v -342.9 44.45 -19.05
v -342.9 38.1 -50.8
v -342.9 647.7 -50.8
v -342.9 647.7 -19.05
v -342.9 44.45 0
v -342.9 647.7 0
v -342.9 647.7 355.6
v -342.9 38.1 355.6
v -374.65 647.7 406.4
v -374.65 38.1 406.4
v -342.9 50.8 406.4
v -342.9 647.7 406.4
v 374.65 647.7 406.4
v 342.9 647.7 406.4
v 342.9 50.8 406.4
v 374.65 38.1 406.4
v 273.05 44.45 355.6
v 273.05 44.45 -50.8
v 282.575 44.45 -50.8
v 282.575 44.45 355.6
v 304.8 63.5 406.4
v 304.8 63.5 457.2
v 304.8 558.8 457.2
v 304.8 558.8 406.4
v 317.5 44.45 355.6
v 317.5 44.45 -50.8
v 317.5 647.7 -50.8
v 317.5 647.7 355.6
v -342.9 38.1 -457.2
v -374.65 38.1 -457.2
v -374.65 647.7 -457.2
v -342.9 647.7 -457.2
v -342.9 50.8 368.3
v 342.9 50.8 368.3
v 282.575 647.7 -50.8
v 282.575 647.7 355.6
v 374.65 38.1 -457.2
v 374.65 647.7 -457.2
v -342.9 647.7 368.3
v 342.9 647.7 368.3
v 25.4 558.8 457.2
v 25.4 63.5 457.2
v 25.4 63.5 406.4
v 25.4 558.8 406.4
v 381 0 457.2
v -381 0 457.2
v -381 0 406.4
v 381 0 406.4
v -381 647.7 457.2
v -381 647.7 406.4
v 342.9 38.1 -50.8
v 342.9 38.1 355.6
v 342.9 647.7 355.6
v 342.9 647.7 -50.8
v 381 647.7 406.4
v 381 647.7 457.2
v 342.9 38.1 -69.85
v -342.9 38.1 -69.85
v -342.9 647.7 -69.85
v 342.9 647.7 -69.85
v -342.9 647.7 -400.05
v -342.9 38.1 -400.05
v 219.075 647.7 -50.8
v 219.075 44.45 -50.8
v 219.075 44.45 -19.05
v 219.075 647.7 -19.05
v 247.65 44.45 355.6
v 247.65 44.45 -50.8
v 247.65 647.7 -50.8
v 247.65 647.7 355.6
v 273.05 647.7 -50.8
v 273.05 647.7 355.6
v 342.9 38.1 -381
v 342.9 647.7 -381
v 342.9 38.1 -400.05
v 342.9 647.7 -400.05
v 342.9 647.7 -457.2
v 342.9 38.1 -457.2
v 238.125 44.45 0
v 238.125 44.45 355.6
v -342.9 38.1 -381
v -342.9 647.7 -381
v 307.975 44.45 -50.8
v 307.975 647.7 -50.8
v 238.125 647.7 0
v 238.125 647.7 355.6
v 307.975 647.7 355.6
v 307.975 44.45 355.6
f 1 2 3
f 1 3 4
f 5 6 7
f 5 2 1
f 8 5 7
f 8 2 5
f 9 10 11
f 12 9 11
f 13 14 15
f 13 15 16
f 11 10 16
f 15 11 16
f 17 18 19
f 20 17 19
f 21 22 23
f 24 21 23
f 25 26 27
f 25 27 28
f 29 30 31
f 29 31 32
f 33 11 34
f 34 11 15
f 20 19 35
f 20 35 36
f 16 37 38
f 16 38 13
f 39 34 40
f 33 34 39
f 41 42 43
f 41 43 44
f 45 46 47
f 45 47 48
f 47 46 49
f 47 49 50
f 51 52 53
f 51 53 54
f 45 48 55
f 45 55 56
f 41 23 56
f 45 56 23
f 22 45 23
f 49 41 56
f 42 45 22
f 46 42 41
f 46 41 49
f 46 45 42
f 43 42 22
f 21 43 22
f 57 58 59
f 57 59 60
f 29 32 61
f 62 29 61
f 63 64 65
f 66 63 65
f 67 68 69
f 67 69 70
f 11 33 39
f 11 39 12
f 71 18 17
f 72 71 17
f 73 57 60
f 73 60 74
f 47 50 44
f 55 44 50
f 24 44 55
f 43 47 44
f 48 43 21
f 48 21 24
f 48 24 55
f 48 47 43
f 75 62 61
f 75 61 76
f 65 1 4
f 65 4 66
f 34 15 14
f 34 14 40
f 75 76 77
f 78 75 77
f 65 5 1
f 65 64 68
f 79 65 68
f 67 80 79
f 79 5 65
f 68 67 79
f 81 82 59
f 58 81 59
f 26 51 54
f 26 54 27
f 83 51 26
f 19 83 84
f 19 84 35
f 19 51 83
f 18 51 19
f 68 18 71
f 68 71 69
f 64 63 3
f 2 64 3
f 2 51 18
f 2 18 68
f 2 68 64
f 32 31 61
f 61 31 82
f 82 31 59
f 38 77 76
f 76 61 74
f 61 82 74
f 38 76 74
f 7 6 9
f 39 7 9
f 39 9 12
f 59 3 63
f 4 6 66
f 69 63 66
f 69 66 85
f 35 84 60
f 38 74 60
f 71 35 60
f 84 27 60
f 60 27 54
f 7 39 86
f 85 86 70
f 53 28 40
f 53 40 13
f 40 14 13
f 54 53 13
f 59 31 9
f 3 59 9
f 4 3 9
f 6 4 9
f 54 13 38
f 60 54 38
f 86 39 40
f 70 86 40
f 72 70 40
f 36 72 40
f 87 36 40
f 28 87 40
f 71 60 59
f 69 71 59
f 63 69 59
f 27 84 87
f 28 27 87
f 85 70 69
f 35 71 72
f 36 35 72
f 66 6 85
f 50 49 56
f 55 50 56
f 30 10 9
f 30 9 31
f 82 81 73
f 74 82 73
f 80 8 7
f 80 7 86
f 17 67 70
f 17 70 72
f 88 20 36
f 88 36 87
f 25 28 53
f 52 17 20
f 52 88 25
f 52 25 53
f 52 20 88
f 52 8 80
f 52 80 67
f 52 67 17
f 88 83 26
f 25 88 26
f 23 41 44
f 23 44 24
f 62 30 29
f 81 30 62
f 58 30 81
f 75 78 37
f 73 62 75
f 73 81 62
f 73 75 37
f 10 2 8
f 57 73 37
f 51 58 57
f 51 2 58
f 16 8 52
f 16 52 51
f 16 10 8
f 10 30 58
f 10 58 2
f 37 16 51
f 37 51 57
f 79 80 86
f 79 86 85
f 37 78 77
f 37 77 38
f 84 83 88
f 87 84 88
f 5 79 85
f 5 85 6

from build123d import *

# Parameters (mm, degrees)
F1_START = -38.1
F0_W     = 685.8
F0_H     = 19.05
F1_DEPTH = 609.6
F2_START = -44.45
F0_W_2   = 9.525
F0_H_2   = 406.4
F0_W_3   = 19.05
F0_H_3   = 31.75
F2_DEPTH = 603.25
F3_DEPTH = 647.7
F4_W     = 279.4
F4_H     = 495.3
F5_DEPTH = 914.401
F6_START = -38.1
F0_H_4   = 38.1
F6_DEPTH = 12.7


# Not quite as in the source:
# - a feature names something its author has since deleted; it is built from what else it names


with BuildPart() as f1:
    # F0 (on Front) → F1 (new body)
    with BuildSketch(Plane.XZ.offset(F1_START)):
        Polygon((-342.9, 355.6), (-374.65, 355.6), (-374.65, -457.2), (-342.9, -457.2), (-342.9, -400.05), (-342.9, -381), (-342.9, -69.85), (-342.9, -50.8), (-342.9, -19.05), (-342.9, 0), align=None)
        Polygon((342.9, -69.85), (342.9, -50.8), (317.5, -50.8), (307.975, -50.8), (282.575, -50.8), (273.05, -50.8), (247.65, -50.8), (238.125, -50.8), (219.075, -50.8), (-342.9, -50.8), (-342.9, -69.85), align=None)
        with Locations((0, -390.525)):
            Rectangle(F0_W, F0_H)
        Polygon((-342.9, 406.4), (-374.65, 406.4), (-374.65, 355.6), (-342.9, 355.6), (-342.9, 368.3), align=None)
        Polygon((374.65, 355.6), (374.65, 406.4), (342.9, 406.4), (342.9, 368.3), (342.9, 355.6), align=None)
        Polygon((-342.9, 368.3), (-342.9, 355.6), (238.125, 355.6), (247.65, 355.6), (273.05, 355.6), (282.575, 355.6), (307.975, 355.6), (317.5, 355.6), (342.9, 355.6), (342.9, 368.3), align=None)
        Polygon((374.65, -457.2), (374.65, 355.6), (342.9, 355.6), (342.9, -50.8), (342.9, -69.85), (342.9, -381), (342.9, -400.05), (342.9, -457.2), align=None)
    extrude(amount=-F1_DEPTH)

    # F0 (on Front) → F2 (join)
    with BuildSketch(Plane.XZ.offset(F2_START)):
        Polygon((247.65, 355.6), (238.125, 355.6), (238.125, 0), (238.125, -19.05), (238.125, -50.8), (247.65, -50.8), align=None)
        with Locations((277.8125, 152.4)):
            Rectangle(F0_W_2, F0_H_2)
        with Locations((312.7375, 152.4)):
            Rectangle(F0_W_2, F0_H_2)
        Polygon((238.125, 0), (-342.9, 0), (-342.9, -19.05), (219.075, -19.05), (238.125, -19.05), align=None)
        with Locations((228.6, -34.925)):
            Rectangle(F0_W_3, F0_H_3)
    extrude(amount=-F2_DEPTH)

    # F0 (on Front) → F6 (join)
    with BuildSketch(Plane.XZ.offset(F6_START)):
        with Locations((0, 387.35)):
            Rectangle(F0_W, F0_H_4)
    extrude(amount=-F6_DEPTH)


with BuildPart() as f3:
    # F0 (on Front) → F3 (new body, through all)
    with BuildSketch(Plane.XZ):
        Polygon((374.65, 457.2), (-374.65, 457.2), (-381, 457.2), (-381, 406.4), (-374.65, 406.4), (-342.9, 406.4), (342.9, 406.4), (374.65, 406.4), (381, 406.4), (381, 457.2), align=None)
    extrude(amount=-F3_DEPTH)

    # F4 (on face) → F5 (cut, through all)
    with BuildSketch(Plane.XY.offset(457.2)):
        with Locations((165.1, 311.15)):
            Rectangle(F4_W, F4_H)
    extrude(amount=-F5_DEPTH, mode=Mode.SUBTRACT)


solid = Compound([f1.part, f3.part])
